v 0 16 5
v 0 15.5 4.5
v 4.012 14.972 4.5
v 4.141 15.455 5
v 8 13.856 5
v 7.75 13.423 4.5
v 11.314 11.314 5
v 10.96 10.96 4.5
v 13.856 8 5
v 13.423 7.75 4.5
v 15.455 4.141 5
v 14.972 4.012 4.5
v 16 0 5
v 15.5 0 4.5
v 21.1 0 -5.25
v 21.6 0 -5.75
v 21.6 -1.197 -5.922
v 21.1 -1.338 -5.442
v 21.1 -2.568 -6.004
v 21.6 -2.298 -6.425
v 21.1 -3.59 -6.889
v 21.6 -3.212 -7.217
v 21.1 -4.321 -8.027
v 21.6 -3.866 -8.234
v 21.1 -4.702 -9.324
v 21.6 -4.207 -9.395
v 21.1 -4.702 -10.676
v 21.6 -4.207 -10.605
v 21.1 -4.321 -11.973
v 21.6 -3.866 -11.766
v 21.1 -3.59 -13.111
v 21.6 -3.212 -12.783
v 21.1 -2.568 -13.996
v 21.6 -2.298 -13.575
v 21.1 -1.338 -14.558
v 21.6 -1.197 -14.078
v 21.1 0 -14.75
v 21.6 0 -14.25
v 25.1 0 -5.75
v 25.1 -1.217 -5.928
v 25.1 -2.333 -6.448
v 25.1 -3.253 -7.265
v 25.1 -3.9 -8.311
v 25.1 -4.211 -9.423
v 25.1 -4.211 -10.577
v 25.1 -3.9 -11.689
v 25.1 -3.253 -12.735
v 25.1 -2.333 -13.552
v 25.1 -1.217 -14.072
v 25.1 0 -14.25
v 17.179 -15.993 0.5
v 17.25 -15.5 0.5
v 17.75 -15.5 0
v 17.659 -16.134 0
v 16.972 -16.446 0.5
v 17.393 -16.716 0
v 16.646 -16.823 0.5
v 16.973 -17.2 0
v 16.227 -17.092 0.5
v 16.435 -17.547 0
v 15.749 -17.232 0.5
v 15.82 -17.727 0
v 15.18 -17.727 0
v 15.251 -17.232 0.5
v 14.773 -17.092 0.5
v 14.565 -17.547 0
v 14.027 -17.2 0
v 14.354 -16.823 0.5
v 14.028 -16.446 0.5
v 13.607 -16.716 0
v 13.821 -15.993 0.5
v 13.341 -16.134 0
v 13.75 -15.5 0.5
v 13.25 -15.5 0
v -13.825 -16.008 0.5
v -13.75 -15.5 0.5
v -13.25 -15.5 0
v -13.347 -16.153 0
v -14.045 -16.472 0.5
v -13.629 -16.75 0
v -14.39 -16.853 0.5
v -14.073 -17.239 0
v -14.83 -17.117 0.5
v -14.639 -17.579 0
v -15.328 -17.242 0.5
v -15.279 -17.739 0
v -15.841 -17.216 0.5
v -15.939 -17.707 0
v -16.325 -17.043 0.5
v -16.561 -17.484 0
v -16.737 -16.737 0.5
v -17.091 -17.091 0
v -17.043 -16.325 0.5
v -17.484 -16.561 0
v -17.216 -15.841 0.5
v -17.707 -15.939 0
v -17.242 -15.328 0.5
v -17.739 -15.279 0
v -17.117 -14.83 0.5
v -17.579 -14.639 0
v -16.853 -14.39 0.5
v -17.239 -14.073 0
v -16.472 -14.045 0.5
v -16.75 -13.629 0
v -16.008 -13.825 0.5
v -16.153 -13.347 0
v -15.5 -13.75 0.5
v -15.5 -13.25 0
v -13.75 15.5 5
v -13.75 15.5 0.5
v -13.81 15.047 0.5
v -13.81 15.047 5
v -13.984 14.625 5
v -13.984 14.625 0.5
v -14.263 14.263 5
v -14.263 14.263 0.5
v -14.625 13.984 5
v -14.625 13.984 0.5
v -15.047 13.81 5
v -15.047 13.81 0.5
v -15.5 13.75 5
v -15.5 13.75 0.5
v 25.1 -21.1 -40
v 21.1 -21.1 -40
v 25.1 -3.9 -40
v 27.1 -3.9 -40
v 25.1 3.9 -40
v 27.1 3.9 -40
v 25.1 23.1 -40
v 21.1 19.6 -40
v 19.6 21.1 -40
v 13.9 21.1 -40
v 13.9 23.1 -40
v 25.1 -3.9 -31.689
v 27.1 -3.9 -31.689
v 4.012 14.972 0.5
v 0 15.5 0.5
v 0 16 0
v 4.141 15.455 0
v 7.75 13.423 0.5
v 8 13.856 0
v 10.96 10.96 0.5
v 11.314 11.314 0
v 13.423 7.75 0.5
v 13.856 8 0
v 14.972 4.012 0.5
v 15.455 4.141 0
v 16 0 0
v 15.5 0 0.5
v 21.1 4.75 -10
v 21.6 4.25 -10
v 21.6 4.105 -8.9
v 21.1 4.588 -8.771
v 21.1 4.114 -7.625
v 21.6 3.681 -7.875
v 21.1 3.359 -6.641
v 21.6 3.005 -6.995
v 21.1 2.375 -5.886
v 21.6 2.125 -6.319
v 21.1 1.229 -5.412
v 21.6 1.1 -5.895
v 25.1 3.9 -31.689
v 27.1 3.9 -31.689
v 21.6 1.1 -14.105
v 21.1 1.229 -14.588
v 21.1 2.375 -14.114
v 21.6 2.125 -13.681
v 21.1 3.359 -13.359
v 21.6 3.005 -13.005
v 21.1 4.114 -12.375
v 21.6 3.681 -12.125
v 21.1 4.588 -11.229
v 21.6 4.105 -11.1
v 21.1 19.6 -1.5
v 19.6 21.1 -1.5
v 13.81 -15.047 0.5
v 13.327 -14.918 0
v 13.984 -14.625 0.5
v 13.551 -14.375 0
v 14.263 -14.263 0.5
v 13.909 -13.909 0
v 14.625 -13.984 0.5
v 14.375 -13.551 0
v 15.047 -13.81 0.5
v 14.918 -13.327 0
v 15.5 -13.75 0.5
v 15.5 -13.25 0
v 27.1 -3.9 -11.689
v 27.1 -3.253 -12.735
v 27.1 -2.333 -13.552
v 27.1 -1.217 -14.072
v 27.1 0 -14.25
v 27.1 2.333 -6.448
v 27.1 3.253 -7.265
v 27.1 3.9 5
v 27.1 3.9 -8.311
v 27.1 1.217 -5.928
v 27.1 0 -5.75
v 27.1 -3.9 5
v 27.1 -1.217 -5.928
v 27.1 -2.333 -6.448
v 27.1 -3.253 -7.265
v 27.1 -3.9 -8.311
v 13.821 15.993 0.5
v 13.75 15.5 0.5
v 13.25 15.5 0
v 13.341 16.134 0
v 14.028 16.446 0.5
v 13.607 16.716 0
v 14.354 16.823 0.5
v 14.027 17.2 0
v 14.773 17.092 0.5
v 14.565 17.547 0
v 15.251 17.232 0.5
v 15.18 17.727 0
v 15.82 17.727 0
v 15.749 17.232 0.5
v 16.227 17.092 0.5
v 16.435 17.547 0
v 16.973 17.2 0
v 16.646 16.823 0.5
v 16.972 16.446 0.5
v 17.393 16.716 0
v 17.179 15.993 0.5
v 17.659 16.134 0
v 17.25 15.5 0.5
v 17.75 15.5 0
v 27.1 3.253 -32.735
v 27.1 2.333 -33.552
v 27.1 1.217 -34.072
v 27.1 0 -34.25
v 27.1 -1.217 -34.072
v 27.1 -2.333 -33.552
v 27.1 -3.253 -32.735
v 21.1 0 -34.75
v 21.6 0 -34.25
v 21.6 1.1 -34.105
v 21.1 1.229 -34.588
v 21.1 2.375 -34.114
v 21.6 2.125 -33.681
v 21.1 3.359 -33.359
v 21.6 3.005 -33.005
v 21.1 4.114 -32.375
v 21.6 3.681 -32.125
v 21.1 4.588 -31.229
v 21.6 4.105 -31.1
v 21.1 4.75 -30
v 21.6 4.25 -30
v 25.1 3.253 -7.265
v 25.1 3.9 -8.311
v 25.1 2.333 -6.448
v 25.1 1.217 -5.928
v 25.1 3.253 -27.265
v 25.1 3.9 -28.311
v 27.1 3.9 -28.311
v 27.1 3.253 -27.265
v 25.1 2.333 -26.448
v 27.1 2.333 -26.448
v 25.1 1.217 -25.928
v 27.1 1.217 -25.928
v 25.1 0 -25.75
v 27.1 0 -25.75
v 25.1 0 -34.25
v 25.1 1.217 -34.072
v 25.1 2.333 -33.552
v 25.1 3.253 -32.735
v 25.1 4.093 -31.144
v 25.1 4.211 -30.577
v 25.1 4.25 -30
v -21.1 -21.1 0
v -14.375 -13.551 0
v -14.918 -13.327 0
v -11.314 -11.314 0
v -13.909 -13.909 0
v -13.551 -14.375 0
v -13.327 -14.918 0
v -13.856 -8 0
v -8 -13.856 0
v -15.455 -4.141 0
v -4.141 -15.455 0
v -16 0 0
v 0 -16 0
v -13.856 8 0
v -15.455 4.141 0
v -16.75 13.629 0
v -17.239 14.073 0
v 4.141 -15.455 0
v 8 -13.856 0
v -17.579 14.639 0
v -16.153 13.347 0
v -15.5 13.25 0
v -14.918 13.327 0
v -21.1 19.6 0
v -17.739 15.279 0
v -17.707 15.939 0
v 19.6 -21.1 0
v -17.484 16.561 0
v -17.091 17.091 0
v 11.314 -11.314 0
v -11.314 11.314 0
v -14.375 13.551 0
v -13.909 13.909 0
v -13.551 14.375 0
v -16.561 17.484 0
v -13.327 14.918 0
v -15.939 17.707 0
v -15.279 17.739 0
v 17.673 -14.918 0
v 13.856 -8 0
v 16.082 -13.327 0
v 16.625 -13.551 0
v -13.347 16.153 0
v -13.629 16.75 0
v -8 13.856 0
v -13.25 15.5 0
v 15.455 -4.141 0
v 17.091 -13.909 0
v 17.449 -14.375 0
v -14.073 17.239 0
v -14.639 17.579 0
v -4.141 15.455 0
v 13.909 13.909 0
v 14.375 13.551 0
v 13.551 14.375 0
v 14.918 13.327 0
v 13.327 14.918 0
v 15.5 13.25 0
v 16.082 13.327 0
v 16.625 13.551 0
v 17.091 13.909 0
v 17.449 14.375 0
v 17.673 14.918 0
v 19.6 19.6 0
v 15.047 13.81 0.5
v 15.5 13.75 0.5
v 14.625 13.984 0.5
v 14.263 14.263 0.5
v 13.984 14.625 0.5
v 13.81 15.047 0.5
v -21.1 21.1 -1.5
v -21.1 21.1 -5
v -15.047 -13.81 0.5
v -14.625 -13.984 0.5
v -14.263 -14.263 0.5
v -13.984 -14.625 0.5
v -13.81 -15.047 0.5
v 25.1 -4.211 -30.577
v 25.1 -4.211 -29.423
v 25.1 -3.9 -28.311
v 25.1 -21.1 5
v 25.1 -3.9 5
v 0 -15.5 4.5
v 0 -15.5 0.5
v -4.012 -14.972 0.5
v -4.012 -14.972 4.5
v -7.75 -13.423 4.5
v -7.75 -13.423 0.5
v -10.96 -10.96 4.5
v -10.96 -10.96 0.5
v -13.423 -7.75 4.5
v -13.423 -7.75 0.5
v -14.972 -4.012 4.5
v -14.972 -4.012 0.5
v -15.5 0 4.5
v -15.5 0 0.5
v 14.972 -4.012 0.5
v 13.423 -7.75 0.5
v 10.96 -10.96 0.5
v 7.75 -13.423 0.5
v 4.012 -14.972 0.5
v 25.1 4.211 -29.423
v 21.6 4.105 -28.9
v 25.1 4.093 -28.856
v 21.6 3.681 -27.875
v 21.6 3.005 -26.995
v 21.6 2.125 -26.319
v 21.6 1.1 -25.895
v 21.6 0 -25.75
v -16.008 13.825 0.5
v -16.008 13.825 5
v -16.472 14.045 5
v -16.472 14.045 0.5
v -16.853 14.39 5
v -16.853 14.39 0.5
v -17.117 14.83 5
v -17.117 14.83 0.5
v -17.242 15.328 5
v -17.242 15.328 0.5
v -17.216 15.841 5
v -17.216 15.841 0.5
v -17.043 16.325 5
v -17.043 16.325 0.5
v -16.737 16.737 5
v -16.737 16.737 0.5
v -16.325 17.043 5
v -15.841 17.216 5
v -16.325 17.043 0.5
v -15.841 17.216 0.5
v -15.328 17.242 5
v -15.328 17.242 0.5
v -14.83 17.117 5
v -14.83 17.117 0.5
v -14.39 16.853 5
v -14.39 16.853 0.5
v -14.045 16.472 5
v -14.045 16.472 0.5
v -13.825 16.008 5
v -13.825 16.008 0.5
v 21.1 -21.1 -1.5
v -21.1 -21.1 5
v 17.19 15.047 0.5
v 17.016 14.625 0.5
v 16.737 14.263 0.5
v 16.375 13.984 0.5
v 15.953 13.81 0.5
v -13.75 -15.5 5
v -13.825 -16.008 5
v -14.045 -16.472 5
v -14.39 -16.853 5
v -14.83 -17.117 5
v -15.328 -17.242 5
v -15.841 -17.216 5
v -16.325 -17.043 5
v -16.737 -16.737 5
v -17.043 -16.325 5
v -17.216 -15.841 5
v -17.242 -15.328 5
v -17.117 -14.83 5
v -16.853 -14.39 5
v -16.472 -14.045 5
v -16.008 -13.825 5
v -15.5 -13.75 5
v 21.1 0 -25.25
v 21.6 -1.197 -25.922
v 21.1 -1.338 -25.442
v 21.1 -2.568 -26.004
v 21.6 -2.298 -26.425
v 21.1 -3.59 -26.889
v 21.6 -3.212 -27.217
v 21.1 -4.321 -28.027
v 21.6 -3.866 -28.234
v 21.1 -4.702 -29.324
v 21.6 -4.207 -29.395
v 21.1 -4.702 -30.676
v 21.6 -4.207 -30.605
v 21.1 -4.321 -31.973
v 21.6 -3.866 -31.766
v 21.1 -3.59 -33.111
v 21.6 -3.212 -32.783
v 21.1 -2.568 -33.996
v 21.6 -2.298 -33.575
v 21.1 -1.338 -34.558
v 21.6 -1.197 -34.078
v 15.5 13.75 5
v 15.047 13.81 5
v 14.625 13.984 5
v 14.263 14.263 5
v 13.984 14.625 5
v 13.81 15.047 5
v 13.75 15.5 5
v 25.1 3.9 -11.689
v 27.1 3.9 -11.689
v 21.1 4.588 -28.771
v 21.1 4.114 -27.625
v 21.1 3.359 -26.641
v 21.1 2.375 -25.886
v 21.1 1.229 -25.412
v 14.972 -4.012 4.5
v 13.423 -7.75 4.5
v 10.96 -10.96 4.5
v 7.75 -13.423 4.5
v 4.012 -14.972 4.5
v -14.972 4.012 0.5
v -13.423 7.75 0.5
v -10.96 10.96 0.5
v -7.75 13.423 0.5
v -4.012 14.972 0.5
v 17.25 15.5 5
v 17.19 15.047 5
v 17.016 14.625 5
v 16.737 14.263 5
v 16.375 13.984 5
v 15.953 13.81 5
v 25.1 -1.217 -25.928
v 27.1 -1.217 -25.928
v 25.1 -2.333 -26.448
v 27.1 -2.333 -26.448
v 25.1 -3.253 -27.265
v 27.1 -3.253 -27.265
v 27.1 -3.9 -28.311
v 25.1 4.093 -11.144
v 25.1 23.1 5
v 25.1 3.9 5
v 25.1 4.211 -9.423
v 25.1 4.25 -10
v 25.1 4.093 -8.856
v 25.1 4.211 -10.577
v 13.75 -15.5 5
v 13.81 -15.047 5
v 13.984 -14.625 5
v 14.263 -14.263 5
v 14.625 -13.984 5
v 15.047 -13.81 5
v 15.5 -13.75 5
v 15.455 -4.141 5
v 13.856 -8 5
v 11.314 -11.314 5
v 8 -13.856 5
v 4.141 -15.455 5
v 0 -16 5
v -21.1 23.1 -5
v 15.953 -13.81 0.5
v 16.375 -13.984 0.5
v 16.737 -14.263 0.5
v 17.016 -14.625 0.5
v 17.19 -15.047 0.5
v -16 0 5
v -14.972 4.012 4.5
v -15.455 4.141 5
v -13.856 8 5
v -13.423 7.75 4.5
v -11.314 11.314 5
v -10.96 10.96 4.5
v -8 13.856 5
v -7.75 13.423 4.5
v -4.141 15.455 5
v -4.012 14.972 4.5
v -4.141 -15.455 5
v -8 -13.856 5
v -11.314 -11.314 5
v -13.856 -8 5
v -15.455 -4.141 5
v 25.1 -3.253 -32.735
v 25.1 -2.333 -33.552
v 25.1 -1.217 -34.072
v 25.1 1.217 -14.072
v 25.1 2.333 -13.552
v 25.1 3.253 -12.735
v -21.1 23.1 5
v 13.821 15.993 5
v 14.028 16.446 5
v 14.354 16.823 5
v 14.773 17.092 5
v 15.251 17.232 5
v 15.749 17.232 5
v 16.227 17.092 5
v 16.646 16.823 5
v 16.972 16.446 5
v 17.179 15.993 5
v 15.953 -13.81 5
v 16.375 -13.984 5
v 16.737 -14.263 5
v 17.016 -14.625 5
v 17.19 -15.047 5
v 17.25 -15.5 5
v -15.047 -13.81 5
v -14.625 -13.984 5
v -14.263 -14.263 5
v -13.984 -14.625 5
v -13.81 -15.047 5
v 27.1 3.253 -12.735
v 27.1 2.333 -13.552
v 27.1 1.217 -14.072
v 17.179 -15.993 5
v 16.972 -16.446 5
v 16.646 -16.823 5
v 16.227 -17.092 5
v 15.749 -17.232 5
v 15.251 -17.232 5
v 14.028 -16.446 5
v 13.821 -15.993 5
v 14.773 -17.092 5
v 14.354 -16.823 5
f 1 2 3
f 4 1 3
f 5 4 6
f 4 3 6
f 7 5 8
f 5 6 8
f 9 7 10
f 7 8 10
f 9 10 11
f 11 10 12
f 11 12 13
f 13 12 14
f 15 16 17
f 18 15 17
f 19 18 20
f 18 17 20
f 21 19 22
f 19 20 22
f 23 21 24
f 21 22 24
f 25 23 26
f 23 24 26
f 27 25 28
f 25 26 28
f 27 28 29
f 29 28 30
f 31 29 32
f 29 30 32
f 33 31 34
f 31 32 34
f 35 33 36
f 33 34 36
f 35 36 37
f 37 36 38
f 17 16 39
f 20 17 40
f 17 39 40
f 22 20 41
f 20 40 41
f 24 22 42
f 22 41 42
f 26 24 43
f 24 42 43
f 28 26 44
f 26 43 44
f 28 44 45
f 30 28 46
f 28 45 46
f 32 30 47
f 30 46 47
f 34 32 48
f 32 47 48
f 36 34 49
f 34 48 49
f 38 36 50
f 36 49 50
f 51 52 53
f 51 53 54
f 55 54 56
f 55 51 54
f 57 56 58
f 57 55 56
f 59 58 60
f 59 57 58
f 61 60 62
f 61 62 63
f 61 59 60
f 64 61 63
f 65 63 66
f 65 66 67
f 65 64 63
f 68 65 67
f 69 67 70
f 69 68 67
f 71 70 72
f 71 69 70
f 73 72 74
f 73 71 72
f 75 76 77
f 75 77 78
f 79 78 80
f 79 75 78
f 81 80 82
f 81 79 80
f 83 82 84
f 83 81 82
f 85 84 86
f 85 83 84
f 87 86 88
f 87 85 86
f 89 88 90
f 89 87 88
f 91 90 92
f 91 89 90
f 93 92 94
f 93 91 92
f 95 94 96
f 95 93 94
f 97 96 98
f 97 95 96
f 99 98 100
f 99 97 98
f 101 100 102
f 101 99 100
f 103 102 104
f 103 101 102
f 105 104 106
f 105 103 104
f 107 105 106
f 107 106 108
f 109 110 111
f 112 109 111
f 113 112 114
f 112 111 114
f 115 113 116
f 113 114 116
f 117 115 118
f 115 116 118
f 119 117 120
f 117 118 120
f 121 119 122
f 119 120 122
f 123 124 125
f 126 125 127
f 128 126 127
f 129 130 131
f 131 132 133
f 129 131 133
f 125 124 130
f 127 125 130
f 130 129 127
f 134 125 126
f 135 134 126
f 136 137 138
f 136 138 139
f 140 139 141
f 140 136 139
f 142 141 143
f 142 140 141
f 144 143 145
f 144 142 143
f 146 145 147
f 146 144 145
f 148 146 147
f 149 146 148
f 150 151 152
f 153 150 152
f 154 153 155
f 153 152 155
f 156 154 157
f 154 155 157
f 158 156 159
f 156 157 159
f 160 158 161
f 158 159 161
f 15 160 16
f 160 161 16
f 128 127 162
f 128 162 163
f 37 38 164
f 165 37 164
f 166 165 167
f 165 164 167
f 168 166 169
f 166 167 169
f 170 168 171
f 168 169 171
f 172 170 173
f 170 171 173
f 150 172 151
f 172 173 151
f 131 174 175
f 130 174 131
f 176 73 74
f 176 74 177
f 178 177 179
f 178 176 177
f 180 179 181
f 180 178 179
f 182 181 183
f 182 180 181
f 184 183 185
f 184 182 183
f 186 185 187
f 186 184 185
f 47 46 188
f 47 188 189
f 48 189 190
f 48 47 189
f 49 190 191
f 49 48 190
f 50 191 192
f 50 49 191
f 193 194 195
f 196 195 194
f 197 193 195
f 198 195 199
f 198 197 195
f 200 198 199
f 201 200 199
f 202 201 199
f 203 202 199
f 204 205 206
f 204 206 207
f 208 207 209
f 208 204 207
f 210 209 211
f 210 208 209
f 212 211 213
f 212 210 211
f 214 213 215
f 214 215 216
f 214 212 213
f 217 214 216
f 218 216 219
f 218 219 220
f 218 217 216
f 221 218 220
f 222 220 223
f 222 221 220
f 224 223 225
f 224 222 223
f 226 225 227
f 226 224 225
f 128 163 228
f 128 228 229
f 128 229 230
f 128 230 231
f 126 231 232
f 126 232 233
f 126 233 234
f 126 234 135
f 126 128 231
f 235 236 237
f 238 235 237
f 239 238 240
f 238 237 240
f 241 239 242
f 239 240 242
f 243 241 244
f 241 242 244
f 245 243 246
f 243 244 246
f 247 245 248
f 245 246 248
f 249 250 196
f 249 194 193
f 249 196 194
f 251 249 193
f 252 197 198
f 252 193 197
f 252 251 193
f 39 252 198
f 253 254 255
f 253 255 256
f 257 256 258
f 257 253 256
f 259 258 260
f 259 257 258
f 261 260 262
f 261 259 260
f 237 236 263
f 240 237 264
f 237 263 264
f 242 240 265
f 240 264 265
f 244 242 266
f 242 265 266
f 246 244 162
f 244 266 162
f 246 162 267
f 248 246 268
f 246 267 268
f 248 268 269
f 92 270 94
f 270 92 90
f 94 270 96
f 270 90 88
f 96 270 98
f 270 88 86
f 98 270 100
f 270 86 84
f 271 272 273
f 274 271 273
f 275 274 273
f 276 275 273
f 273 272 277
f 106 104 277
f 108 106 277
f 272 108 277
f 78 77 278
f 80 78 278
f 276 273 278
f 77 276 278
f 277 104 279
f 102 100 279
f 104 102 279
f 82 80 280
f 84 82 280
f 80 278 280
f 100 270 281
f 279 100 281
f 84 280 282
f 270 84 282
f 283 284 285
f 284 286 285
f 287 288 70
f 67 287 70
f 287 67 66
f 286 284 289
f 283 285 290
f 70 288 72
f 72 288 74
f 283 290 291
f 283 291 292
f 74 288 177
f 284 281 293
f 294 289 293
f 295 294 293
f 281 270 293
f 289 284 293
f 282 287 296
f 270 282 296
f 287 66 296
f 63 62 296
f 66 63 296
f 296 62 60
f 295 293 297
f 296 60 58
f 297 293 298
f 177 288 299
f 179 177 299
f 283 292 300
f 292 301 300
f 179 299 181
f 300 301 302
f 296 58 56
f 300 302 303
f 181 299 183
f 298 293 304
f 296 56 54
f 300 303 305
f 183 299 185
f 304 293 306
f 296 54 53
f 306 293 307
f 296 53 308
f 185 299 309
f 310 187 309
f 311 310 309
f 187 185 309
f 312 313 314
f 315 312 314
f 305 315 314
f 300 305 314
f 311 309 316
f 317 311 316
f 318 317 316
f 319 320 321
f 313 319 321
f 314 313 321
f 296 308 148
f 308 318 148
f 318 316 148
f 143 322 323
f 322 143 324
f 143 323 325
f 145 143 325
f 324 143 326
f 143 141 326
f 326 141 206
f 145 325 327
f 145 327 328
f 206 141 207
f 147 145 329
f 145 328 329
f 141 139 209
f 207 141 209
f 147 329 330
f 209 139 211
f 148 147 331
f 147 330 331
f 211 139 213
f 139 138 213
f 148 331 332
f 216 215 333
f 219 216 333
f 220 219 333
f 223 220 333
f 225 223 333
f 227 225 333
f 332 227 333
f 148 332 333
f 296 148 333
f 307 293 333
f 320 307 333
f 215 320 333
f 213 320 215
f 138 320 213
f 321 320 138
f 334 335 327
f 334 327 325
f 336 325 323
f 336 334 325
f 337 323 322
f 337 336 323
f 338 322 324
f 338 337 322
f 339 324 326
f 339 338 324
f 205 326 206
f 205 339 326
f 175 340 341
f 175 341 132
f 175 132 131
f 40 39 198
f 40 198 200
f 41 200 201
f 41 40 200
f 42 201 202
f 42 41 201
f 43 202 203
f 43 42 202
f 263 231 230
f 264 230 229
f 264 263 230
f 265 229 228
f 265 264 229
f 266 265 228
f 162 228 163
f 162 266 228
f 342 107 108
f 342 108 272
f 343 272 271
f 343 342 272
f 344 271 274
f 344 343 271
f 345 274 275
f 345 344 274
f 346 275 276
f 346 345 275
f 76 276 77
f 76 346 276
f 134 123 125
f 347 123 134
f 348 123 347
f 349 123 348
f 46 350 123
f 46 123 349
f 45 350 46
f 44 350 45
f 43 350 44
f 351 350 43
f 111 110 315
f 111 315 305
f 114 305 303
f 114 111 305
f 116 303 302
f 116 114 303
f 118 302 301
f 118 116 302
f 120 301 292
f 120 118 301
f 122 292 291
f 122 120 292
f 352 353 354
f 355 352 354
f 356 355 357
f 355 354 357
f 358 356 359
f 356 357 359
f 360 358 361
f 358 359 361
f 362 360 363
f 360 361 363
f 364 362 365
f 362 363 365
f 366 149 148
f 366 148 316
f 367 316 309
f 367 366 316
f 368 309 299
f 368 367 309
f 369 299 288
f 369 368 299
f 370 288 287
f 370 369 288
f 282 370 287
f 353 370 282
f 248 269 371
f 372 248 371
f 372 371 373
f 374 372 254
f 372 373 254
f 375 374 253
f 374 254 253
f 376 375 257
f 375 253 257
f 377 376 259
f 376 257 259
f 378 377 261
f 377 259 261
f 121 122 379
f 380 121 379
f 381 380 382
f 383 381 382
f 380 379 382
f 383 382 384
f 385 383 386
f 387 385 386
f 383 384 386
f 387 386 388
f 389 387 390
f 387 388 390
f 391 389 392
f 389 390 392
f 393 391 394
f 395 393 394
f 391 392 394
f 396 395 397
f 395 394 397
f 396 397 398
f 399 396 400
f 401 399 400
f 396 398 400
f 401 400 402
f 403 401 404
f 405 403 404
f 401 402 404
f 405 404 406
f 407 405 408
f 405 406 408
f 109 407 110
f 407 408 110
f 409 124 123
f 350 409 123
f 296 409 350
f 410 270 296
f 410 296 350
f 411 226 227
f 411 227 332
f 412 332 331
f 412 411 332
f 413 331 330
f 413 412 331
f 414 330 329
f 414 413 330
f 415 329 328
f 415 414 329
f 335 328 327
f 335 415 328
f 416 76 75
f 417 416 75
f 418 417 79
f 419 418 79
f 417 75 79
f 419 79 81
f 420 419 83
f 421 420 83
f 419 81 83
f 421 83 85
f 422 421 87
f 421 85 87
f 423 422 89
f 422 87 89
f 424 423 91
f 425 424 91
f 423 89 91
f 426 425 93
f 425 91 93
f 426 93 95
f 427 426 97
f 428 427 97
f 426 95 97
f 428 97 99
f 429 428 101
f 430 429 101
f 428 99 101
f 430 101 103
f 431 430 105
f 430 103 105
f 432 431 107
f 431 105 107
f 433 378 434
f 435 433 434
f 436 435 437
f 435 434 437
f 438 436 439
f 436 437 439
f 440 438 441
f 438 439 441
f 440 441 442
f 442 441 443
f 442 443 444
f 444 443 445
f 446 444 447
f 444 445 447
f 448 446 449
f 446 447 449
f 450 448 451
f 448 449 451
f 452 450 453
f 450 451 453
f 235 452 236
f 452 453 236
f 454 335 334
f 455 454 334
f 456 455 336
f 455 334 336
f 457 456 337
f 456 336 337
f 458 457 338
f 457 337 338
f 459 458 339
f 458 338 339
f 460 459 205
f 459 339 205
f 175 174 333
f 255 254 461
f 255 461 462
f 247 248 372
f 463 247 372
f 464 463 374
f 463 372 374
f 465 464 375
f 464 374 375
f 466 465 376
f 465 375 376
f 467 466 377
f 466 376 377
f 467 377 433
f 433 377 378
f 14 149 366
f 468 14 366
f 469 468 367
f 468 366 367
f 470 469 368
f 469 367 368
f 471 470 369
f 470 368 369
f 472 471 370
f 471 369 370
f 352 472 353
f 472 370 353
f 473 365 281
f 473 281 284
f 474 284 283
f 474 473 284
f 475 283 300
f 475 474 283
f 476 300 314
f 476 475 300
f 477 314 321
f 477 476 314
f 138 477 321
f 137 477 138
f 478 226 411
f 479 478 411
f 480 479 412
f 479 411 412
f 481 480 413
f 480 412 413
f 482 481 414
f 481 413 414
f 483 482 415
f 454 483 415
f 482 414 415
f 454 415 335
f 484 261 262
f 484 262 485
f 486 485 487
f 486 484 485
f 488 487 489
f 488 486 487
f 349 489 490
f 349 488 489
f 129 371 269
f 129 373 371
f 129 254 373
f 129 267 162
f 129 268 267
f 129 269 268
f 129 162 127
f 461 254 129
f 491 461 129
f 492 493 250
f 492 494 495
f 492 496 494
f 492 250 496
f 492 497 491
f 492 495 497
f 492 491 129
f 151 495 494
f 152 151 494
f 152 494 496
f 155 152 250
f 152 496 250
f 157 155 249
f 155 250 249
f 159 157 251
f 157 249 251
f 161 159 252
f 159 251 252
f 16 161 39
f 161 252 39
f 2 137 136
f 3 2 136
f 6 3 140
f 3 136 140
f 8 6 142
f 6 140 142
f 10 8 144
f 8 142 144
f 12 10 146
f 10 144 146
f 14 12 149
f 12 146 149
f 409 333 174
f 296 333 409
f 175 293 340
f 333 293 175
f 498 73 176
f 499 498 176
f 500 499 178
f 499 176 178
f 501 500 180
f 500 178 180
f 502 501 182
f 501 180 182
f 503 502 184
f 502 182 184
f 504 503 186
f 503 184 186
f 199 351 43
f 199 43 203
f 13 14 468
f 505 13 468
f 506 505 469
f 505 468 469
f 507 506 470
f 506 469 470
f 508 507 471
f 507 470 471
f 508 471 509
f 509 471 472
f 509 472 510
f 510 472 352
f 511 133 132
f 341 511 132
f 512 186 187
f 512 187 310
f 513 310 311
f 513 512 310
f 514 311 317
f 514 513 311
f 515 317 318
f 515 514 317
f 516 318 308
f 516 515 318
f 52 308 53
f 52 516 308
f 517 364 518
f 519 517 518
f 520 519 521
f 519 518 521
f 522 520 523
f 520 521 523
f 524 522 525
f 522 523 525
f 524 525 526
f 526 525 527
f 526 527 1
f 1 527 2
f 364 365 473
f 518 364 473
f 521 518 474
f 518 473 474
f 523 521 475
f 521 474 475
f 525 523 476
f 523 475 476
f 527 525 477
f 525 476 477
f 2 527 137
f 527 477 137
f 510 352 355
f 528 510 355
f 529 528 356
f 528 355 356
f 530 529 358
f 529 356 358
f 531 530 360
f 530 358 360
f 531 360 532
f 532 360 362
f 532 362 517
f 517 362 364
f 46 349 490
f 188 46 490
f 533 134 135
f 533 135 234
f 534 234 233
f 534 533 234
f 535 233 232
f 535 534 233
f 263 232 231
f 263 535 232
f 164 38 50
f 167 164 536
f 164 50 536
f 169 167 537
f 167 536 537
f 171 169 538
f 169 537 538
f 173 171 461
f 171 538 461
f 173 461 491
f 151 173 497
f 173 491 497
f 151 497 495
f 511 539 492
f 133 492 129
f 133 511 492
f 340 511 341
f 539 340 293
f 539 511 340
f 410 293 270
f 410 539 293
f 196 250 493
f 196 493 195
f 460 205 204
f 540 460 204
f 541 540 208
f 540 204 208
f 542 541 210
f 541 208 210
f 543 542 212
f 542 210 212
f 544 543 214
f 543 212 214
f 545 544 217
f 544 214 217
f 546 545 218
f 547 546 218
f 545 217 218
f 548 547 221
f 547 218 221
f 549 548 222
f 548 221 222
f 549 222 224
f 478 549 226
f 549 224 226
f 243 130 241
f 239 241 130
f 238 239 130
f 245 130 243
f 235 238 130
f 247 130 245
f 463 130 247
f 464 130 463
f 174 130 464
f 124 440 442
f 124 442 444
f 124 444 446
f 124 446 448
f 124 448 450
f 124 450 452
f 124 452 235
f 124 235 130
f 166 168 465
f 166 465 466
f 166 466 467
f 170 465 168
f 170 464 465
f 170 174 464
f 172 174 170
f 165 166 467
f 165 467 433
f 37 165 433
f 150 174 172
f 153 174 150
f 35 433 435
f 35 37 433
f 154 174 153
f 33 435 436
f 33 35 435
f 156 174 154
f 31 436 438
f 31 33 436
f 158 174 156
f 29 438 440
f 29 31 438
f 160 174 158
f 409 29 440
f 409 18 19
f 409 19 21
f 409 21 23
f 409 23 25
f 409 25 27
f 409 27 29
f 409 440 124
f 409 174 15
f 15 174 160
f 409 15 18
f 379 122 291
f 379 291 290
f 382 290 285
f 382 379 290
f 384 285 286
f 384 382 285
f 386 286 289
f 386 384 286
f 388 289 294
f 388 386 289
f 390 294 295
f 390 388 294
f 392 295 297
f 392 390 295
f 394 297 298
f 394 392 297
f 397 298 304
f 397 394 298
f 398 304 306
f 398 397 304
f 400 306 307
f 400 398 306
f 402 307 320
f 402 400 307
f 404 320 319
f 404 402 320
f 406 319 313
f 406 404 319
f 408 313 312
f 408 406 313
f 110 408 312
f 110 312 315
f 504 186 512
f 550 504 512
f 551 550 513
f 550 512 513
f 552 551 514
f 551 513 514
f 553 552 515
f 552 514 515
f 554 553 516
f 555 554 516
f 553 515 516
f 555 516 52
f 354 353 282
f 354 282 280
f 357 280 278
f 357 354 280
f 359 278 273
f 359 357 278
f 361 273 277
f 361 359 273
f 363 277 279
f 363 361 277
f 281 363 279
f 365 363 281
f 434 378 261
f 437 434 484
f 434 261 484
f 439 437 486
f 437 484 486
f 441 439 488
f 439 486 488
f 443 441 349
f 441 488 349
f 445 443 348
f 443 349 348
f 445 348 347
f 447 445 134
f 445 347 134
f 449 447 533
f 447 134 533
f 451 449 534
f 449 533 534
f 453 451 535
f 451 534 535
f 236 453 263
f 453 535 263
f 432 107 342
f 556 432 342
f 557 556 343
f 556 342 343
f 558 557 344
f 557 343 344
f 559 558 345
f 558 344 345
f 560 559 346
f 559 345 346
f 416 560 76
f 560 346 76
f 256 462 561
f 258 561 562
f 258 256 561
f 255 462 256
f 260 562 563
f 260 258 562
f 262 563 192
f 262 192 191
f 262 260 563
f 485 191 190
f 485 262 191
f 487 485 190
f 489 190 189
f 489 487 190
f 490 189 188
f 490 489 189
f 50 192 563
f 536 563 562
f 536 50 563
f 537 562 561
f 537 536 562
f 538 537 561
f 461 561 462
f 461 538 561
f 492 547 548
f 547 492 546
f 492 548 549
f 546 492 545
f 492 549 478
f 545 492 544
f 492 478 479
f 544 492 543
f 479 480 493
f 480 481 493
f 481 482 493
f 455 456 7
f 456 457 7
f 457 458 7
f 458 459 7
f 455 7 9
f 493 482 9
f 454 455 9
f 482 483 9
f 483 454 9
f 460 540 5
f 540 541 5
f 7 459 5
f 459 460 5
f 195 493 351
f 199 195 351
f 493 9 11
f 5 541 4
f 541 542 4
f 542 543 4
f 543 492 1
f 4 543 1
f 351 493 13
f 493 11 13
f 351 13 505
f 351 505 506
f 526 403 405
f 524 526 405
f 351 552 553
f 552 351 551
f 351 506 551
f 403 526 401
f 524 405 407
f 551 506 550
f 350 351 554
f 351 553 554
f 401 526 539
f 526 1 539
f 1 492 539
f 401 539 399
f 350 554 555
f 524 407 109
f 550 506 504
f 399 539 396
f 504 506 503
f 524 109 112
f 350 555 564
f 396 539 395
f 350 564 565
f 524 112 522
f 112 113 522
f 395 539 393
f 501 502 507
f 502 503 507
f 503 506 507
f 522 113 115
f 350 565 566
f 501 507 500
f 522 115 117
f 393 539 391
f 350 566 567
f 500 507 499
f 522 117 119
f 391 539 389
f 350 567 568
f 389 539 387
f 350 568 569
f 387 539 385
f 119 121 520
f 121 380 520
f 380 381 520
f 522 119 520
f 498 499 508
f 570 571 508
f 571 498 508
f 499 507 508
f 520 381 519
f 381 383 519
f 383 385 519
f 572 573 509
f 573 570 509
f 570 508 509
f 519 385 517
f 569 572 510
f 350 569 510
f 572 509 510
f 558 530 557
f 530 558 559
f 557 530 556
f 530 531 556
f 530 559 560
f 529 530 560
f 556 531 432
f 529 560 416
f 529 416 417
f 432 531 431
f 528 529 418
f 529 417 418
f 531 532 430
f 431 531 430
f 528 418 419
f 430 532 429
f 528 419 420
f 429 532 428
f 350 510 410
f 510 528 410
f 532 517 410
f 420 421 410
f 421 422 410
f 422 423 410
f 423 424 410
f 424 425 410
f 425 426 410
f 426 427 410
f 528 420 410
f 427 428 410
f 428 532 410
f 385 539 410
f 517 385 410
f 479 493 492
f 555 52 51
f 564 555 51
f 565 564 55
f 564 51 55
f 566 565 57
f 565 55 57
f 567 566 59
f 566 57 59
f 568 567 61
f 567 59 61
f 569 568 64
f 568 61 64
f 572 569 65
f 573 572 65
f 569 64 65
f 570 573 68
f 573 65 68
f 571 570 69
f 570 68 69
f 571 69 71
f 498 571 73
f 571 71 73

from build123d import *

# Parameters (mm, degrees)
F0_W      = 42.2
F0_H      = 42.2
F1_DEPTH  = 5
F2_DEPTH  = 40
F3_DEPTH  = 2
F5_DEPTH  = 25
F4_W      = 3.9
F4_H      = 6.5
F6_DEPTH  = 2
F7_SIZE   = 0.5
F8_SIZE   = 35
F9_DEPTH  = 16.75
F10_DEPTH = 21.75
F11_DEPTH = 25
F12_SIZE  = 1.5


# Not quite as in the source:
# - a feature names something its author has since deleted; it is built from what else it names


with BuildPart() as f1:
    # F0 (on Top) → F1 (new body)
    with BuildSketch(Plane.XY):
        Rectangle(F0_W, F0_H)
        with BuildLine():
            ThreePointArc((-15.5, 13.75), (-16.7374368671, 16.7374368671), (-13.75, 15.5))
            Line((-13.75, 15.5), (0, 15.5))
            Line((0, 15.5), (13.75, 15.5))
            ThreePointArc((13.75, 15.5), (15.5, 17.25), (17.25, 15.5))
            ThreePointArc((17.25, 15.5), (16.7374368671, 14.2625631329), (15.5, 13.75))
            Line((15.5, 13.75), (15.5, 0))
            Line((15.5, 0), (15.5, -13.75))
            ThreePointArc((15.5, -13.75), (16.7374368671, -14.2625631329), (17.25, -15.5))
            ThreePointArc((17.25, -15.5), (15.5, -17.25), (13.75, -15.5))
            Line((13.75, -15.5), (0, -15.5))
            Line((0, -15.5), (-13.75, -15.5))
            ThreePointArc((-13.75, -15.5), (-16.7374368671, -16.7374368671), (-15.5, -13.75))
            Line((-15.5, -13.75), (-15.5, 0))
            Line((-15.5, 0), (-15.5, 13.75))
        make_face(mode=Mode.SUBTRACT)
        Polygon((-21.1, 21.1), (21.1, 21.1), (21.1, -21.1), (23.1, -21.1), (23.1, 23.1), (-21.1, 23.1), align=None)
        with BuildLine():
            Line((0, 15.5), (-13.75, 15.5))
            ThreePointArc((-13.75, 15.5), (-14.2625631329, 14.2625631329), (-15.5, 13.75))
            Line((-15.5, 13.75), (-15.5, 0))
            ThreePointArc((-15.5, 0), (-10.9601551084, 10.9601551084), (0, 15.5))
        make_face()
        with BuildLine():
            ThreePointArc((0, -15.5), (-10.9601551084, -10.9601551084), (-15.5, 0))
            Line((-15.5, 0), (-15.5, -13.75))
            ThreePointArc((-15.5, -13.75), (-14.2625631329, -14.2625631329), (-13.75, -15.5))
            Line((-13.75, -15.5), (0, -15.5))
        make_face()
        with BuildLine():
            Line((15.5, -13.75), (15.5, 0))
            ThreePointArc((15.5, 0), (10.9601551084, -10.9601551084), (0, -15.5))
            Line((0, -15.5), (13.75, -15.5))
            ThreePointArc((13.75, -15.5), (14.2625631329, -14.2625631329), (15.5, -13.75))
        make_face()
        with BuildLine():
            Line((13.75, 15.5), (0, 15.5))
            ThreePointArc((0, 15.5), (10.9601551084, 10.9601551084), (15.5, 0))
            Line((15.5, 0), (15.5, 13.75))
            ThreePointArc((15.5, 13.75), (14.2625631329, 14.2625631329), (13.75, 15.5))
        make_face()
    extrude(amount=F1_DEPTH)

    # F0 (on Top) → F2 (join)
    with BuildSketch(Plane.XY):
        Polygon((-21.1, 21.1), (21.1, 21.1), (21.1, -21.1), (23.1, -21.1), (23.1, 23.1), (-21.1, 23.1), align=None)
    extrude(amount=-F2_DEPTH)

    # F3 (add): a face of the model
    f3_faces = [f1.faces().sort_by_distance(p)[0] for p in [
        (23.1, 1, -17.5),
    ]]
    extrude(f3_faces, amount=F3_DEPTH)

    # F4 (on face) → F5 (cut)
    with BuildSketch(Plane.YZ.offset(25.1)):
        with BuildLine():
            ThreePointArc((4.25, -10), (3.00520382, -6.99479618), (0, -5.75))
            Line((0, -5.75), (0, -10))
            Line((0, -10), (0, -14.25))
            ThreePointArc((0, -14.25), (3.00520382, -13.00520382), (4.25, -10))
        make_face()
        with BuildLine():
            Line((0, -10), (0, -5.75))
            ThreePointArc((0, -5.75), (-4.25, -10), (0, -14.25))
            Line((0, -14.25), (0, -10))
        make_face()
        with BuildLine():
            Line((0, -30), (0, -34.25))
            ThreePointArc((0, -34.25), (3.00520382, -33.00520382), (4.25, -30))
            Line((4.25, -30), (0, -30))
        make_face()
        with BuildLine():
            ThreePointArc((0, -25.75), (-4.25, -30), (0, -34.25))
            Line((0, -34.25), (0, -30))
            Line((0, -30), (0, -25.75))
        make_face()
        with BuildLine():
            ThreePointArc((4.25, -30), (3.00520382, -26.99479618), (0, -25.75))
            Line((0, -25.75), (0, -30))
            Line((0, -30), (4.25, -30))
        make_face()
    extrude(amount=-F5_DEPTH, mode=Mode.SUBTRACT)

    # F4 (on face) → F6 (join)
    with BuildSketch(Plane.YZ.offset(25.1)):
        with Locations((1.95, -20)):
            Rectangle(F4_W, F4_H)
        with Locations((-1.95, -20)):
            Rectangle(F4_W, F4_H)
    extrude(amount=F6_DEPTH)

    # F7
    f7_edges = [f1.edges().sort_by_distance(p)[0] for p in [
        (21.1, -4.25, -30),
        (21.1, -4.25, -10),
        (0, -15.5, 5),
        (0, -15.5, 0),
        (-17.25, 15.5, 0),
        (-15.5, -17.25, 0),
        (17.25, -15.5, 0),
        (15.5, 17.25, 0),
    ]]
    chamfer(f7_edges, length=F7_SIZE)

    # F8
    f8_edges = [f1.edges().sort_by_distance(p)[0] for p in [
        (-21.1, 22.1, -40),
    ]]
    chamfer(f8_edges, length=F8_SIZE)

    # F9 (add): a face of the model
    f9_faces = [f1.faces().sort_by_distance(p)[0] for p in [
        (26.1, 0, -23.25),
    ]]
    extrude(f9_faces, amount=F9_DEPTH)

    # F10 (add): a face of the model
    f10_faces = [f1.faces().sort_by_distance(p)[0] for p in [
        (26.1, 0, -16.75),
    ]]
    extrude(f10_faces, amount=F10_DEPTH)

    # F11 (cut): faces of the model
    f11_faces = [f1.faces().sort_by_distance(p)[0] for p in [
        (25.1, 0, -10),
        (25.1, 0, -30),
    ]]
    extrude(f11_faces, amount=-F11_DEPTH, mode=Mode.SUBTRACT)

    # F12
    f12_edges = [f1.edges().sort_by_distance(p)[0] for p in [
        (21.1, 0, 0),
        (21.1, 21.1, -20),
        (0, 21.1, 0),
    ]]
    chamfer(f12_edges, length=F12_SIZE)


solid = f1.part
